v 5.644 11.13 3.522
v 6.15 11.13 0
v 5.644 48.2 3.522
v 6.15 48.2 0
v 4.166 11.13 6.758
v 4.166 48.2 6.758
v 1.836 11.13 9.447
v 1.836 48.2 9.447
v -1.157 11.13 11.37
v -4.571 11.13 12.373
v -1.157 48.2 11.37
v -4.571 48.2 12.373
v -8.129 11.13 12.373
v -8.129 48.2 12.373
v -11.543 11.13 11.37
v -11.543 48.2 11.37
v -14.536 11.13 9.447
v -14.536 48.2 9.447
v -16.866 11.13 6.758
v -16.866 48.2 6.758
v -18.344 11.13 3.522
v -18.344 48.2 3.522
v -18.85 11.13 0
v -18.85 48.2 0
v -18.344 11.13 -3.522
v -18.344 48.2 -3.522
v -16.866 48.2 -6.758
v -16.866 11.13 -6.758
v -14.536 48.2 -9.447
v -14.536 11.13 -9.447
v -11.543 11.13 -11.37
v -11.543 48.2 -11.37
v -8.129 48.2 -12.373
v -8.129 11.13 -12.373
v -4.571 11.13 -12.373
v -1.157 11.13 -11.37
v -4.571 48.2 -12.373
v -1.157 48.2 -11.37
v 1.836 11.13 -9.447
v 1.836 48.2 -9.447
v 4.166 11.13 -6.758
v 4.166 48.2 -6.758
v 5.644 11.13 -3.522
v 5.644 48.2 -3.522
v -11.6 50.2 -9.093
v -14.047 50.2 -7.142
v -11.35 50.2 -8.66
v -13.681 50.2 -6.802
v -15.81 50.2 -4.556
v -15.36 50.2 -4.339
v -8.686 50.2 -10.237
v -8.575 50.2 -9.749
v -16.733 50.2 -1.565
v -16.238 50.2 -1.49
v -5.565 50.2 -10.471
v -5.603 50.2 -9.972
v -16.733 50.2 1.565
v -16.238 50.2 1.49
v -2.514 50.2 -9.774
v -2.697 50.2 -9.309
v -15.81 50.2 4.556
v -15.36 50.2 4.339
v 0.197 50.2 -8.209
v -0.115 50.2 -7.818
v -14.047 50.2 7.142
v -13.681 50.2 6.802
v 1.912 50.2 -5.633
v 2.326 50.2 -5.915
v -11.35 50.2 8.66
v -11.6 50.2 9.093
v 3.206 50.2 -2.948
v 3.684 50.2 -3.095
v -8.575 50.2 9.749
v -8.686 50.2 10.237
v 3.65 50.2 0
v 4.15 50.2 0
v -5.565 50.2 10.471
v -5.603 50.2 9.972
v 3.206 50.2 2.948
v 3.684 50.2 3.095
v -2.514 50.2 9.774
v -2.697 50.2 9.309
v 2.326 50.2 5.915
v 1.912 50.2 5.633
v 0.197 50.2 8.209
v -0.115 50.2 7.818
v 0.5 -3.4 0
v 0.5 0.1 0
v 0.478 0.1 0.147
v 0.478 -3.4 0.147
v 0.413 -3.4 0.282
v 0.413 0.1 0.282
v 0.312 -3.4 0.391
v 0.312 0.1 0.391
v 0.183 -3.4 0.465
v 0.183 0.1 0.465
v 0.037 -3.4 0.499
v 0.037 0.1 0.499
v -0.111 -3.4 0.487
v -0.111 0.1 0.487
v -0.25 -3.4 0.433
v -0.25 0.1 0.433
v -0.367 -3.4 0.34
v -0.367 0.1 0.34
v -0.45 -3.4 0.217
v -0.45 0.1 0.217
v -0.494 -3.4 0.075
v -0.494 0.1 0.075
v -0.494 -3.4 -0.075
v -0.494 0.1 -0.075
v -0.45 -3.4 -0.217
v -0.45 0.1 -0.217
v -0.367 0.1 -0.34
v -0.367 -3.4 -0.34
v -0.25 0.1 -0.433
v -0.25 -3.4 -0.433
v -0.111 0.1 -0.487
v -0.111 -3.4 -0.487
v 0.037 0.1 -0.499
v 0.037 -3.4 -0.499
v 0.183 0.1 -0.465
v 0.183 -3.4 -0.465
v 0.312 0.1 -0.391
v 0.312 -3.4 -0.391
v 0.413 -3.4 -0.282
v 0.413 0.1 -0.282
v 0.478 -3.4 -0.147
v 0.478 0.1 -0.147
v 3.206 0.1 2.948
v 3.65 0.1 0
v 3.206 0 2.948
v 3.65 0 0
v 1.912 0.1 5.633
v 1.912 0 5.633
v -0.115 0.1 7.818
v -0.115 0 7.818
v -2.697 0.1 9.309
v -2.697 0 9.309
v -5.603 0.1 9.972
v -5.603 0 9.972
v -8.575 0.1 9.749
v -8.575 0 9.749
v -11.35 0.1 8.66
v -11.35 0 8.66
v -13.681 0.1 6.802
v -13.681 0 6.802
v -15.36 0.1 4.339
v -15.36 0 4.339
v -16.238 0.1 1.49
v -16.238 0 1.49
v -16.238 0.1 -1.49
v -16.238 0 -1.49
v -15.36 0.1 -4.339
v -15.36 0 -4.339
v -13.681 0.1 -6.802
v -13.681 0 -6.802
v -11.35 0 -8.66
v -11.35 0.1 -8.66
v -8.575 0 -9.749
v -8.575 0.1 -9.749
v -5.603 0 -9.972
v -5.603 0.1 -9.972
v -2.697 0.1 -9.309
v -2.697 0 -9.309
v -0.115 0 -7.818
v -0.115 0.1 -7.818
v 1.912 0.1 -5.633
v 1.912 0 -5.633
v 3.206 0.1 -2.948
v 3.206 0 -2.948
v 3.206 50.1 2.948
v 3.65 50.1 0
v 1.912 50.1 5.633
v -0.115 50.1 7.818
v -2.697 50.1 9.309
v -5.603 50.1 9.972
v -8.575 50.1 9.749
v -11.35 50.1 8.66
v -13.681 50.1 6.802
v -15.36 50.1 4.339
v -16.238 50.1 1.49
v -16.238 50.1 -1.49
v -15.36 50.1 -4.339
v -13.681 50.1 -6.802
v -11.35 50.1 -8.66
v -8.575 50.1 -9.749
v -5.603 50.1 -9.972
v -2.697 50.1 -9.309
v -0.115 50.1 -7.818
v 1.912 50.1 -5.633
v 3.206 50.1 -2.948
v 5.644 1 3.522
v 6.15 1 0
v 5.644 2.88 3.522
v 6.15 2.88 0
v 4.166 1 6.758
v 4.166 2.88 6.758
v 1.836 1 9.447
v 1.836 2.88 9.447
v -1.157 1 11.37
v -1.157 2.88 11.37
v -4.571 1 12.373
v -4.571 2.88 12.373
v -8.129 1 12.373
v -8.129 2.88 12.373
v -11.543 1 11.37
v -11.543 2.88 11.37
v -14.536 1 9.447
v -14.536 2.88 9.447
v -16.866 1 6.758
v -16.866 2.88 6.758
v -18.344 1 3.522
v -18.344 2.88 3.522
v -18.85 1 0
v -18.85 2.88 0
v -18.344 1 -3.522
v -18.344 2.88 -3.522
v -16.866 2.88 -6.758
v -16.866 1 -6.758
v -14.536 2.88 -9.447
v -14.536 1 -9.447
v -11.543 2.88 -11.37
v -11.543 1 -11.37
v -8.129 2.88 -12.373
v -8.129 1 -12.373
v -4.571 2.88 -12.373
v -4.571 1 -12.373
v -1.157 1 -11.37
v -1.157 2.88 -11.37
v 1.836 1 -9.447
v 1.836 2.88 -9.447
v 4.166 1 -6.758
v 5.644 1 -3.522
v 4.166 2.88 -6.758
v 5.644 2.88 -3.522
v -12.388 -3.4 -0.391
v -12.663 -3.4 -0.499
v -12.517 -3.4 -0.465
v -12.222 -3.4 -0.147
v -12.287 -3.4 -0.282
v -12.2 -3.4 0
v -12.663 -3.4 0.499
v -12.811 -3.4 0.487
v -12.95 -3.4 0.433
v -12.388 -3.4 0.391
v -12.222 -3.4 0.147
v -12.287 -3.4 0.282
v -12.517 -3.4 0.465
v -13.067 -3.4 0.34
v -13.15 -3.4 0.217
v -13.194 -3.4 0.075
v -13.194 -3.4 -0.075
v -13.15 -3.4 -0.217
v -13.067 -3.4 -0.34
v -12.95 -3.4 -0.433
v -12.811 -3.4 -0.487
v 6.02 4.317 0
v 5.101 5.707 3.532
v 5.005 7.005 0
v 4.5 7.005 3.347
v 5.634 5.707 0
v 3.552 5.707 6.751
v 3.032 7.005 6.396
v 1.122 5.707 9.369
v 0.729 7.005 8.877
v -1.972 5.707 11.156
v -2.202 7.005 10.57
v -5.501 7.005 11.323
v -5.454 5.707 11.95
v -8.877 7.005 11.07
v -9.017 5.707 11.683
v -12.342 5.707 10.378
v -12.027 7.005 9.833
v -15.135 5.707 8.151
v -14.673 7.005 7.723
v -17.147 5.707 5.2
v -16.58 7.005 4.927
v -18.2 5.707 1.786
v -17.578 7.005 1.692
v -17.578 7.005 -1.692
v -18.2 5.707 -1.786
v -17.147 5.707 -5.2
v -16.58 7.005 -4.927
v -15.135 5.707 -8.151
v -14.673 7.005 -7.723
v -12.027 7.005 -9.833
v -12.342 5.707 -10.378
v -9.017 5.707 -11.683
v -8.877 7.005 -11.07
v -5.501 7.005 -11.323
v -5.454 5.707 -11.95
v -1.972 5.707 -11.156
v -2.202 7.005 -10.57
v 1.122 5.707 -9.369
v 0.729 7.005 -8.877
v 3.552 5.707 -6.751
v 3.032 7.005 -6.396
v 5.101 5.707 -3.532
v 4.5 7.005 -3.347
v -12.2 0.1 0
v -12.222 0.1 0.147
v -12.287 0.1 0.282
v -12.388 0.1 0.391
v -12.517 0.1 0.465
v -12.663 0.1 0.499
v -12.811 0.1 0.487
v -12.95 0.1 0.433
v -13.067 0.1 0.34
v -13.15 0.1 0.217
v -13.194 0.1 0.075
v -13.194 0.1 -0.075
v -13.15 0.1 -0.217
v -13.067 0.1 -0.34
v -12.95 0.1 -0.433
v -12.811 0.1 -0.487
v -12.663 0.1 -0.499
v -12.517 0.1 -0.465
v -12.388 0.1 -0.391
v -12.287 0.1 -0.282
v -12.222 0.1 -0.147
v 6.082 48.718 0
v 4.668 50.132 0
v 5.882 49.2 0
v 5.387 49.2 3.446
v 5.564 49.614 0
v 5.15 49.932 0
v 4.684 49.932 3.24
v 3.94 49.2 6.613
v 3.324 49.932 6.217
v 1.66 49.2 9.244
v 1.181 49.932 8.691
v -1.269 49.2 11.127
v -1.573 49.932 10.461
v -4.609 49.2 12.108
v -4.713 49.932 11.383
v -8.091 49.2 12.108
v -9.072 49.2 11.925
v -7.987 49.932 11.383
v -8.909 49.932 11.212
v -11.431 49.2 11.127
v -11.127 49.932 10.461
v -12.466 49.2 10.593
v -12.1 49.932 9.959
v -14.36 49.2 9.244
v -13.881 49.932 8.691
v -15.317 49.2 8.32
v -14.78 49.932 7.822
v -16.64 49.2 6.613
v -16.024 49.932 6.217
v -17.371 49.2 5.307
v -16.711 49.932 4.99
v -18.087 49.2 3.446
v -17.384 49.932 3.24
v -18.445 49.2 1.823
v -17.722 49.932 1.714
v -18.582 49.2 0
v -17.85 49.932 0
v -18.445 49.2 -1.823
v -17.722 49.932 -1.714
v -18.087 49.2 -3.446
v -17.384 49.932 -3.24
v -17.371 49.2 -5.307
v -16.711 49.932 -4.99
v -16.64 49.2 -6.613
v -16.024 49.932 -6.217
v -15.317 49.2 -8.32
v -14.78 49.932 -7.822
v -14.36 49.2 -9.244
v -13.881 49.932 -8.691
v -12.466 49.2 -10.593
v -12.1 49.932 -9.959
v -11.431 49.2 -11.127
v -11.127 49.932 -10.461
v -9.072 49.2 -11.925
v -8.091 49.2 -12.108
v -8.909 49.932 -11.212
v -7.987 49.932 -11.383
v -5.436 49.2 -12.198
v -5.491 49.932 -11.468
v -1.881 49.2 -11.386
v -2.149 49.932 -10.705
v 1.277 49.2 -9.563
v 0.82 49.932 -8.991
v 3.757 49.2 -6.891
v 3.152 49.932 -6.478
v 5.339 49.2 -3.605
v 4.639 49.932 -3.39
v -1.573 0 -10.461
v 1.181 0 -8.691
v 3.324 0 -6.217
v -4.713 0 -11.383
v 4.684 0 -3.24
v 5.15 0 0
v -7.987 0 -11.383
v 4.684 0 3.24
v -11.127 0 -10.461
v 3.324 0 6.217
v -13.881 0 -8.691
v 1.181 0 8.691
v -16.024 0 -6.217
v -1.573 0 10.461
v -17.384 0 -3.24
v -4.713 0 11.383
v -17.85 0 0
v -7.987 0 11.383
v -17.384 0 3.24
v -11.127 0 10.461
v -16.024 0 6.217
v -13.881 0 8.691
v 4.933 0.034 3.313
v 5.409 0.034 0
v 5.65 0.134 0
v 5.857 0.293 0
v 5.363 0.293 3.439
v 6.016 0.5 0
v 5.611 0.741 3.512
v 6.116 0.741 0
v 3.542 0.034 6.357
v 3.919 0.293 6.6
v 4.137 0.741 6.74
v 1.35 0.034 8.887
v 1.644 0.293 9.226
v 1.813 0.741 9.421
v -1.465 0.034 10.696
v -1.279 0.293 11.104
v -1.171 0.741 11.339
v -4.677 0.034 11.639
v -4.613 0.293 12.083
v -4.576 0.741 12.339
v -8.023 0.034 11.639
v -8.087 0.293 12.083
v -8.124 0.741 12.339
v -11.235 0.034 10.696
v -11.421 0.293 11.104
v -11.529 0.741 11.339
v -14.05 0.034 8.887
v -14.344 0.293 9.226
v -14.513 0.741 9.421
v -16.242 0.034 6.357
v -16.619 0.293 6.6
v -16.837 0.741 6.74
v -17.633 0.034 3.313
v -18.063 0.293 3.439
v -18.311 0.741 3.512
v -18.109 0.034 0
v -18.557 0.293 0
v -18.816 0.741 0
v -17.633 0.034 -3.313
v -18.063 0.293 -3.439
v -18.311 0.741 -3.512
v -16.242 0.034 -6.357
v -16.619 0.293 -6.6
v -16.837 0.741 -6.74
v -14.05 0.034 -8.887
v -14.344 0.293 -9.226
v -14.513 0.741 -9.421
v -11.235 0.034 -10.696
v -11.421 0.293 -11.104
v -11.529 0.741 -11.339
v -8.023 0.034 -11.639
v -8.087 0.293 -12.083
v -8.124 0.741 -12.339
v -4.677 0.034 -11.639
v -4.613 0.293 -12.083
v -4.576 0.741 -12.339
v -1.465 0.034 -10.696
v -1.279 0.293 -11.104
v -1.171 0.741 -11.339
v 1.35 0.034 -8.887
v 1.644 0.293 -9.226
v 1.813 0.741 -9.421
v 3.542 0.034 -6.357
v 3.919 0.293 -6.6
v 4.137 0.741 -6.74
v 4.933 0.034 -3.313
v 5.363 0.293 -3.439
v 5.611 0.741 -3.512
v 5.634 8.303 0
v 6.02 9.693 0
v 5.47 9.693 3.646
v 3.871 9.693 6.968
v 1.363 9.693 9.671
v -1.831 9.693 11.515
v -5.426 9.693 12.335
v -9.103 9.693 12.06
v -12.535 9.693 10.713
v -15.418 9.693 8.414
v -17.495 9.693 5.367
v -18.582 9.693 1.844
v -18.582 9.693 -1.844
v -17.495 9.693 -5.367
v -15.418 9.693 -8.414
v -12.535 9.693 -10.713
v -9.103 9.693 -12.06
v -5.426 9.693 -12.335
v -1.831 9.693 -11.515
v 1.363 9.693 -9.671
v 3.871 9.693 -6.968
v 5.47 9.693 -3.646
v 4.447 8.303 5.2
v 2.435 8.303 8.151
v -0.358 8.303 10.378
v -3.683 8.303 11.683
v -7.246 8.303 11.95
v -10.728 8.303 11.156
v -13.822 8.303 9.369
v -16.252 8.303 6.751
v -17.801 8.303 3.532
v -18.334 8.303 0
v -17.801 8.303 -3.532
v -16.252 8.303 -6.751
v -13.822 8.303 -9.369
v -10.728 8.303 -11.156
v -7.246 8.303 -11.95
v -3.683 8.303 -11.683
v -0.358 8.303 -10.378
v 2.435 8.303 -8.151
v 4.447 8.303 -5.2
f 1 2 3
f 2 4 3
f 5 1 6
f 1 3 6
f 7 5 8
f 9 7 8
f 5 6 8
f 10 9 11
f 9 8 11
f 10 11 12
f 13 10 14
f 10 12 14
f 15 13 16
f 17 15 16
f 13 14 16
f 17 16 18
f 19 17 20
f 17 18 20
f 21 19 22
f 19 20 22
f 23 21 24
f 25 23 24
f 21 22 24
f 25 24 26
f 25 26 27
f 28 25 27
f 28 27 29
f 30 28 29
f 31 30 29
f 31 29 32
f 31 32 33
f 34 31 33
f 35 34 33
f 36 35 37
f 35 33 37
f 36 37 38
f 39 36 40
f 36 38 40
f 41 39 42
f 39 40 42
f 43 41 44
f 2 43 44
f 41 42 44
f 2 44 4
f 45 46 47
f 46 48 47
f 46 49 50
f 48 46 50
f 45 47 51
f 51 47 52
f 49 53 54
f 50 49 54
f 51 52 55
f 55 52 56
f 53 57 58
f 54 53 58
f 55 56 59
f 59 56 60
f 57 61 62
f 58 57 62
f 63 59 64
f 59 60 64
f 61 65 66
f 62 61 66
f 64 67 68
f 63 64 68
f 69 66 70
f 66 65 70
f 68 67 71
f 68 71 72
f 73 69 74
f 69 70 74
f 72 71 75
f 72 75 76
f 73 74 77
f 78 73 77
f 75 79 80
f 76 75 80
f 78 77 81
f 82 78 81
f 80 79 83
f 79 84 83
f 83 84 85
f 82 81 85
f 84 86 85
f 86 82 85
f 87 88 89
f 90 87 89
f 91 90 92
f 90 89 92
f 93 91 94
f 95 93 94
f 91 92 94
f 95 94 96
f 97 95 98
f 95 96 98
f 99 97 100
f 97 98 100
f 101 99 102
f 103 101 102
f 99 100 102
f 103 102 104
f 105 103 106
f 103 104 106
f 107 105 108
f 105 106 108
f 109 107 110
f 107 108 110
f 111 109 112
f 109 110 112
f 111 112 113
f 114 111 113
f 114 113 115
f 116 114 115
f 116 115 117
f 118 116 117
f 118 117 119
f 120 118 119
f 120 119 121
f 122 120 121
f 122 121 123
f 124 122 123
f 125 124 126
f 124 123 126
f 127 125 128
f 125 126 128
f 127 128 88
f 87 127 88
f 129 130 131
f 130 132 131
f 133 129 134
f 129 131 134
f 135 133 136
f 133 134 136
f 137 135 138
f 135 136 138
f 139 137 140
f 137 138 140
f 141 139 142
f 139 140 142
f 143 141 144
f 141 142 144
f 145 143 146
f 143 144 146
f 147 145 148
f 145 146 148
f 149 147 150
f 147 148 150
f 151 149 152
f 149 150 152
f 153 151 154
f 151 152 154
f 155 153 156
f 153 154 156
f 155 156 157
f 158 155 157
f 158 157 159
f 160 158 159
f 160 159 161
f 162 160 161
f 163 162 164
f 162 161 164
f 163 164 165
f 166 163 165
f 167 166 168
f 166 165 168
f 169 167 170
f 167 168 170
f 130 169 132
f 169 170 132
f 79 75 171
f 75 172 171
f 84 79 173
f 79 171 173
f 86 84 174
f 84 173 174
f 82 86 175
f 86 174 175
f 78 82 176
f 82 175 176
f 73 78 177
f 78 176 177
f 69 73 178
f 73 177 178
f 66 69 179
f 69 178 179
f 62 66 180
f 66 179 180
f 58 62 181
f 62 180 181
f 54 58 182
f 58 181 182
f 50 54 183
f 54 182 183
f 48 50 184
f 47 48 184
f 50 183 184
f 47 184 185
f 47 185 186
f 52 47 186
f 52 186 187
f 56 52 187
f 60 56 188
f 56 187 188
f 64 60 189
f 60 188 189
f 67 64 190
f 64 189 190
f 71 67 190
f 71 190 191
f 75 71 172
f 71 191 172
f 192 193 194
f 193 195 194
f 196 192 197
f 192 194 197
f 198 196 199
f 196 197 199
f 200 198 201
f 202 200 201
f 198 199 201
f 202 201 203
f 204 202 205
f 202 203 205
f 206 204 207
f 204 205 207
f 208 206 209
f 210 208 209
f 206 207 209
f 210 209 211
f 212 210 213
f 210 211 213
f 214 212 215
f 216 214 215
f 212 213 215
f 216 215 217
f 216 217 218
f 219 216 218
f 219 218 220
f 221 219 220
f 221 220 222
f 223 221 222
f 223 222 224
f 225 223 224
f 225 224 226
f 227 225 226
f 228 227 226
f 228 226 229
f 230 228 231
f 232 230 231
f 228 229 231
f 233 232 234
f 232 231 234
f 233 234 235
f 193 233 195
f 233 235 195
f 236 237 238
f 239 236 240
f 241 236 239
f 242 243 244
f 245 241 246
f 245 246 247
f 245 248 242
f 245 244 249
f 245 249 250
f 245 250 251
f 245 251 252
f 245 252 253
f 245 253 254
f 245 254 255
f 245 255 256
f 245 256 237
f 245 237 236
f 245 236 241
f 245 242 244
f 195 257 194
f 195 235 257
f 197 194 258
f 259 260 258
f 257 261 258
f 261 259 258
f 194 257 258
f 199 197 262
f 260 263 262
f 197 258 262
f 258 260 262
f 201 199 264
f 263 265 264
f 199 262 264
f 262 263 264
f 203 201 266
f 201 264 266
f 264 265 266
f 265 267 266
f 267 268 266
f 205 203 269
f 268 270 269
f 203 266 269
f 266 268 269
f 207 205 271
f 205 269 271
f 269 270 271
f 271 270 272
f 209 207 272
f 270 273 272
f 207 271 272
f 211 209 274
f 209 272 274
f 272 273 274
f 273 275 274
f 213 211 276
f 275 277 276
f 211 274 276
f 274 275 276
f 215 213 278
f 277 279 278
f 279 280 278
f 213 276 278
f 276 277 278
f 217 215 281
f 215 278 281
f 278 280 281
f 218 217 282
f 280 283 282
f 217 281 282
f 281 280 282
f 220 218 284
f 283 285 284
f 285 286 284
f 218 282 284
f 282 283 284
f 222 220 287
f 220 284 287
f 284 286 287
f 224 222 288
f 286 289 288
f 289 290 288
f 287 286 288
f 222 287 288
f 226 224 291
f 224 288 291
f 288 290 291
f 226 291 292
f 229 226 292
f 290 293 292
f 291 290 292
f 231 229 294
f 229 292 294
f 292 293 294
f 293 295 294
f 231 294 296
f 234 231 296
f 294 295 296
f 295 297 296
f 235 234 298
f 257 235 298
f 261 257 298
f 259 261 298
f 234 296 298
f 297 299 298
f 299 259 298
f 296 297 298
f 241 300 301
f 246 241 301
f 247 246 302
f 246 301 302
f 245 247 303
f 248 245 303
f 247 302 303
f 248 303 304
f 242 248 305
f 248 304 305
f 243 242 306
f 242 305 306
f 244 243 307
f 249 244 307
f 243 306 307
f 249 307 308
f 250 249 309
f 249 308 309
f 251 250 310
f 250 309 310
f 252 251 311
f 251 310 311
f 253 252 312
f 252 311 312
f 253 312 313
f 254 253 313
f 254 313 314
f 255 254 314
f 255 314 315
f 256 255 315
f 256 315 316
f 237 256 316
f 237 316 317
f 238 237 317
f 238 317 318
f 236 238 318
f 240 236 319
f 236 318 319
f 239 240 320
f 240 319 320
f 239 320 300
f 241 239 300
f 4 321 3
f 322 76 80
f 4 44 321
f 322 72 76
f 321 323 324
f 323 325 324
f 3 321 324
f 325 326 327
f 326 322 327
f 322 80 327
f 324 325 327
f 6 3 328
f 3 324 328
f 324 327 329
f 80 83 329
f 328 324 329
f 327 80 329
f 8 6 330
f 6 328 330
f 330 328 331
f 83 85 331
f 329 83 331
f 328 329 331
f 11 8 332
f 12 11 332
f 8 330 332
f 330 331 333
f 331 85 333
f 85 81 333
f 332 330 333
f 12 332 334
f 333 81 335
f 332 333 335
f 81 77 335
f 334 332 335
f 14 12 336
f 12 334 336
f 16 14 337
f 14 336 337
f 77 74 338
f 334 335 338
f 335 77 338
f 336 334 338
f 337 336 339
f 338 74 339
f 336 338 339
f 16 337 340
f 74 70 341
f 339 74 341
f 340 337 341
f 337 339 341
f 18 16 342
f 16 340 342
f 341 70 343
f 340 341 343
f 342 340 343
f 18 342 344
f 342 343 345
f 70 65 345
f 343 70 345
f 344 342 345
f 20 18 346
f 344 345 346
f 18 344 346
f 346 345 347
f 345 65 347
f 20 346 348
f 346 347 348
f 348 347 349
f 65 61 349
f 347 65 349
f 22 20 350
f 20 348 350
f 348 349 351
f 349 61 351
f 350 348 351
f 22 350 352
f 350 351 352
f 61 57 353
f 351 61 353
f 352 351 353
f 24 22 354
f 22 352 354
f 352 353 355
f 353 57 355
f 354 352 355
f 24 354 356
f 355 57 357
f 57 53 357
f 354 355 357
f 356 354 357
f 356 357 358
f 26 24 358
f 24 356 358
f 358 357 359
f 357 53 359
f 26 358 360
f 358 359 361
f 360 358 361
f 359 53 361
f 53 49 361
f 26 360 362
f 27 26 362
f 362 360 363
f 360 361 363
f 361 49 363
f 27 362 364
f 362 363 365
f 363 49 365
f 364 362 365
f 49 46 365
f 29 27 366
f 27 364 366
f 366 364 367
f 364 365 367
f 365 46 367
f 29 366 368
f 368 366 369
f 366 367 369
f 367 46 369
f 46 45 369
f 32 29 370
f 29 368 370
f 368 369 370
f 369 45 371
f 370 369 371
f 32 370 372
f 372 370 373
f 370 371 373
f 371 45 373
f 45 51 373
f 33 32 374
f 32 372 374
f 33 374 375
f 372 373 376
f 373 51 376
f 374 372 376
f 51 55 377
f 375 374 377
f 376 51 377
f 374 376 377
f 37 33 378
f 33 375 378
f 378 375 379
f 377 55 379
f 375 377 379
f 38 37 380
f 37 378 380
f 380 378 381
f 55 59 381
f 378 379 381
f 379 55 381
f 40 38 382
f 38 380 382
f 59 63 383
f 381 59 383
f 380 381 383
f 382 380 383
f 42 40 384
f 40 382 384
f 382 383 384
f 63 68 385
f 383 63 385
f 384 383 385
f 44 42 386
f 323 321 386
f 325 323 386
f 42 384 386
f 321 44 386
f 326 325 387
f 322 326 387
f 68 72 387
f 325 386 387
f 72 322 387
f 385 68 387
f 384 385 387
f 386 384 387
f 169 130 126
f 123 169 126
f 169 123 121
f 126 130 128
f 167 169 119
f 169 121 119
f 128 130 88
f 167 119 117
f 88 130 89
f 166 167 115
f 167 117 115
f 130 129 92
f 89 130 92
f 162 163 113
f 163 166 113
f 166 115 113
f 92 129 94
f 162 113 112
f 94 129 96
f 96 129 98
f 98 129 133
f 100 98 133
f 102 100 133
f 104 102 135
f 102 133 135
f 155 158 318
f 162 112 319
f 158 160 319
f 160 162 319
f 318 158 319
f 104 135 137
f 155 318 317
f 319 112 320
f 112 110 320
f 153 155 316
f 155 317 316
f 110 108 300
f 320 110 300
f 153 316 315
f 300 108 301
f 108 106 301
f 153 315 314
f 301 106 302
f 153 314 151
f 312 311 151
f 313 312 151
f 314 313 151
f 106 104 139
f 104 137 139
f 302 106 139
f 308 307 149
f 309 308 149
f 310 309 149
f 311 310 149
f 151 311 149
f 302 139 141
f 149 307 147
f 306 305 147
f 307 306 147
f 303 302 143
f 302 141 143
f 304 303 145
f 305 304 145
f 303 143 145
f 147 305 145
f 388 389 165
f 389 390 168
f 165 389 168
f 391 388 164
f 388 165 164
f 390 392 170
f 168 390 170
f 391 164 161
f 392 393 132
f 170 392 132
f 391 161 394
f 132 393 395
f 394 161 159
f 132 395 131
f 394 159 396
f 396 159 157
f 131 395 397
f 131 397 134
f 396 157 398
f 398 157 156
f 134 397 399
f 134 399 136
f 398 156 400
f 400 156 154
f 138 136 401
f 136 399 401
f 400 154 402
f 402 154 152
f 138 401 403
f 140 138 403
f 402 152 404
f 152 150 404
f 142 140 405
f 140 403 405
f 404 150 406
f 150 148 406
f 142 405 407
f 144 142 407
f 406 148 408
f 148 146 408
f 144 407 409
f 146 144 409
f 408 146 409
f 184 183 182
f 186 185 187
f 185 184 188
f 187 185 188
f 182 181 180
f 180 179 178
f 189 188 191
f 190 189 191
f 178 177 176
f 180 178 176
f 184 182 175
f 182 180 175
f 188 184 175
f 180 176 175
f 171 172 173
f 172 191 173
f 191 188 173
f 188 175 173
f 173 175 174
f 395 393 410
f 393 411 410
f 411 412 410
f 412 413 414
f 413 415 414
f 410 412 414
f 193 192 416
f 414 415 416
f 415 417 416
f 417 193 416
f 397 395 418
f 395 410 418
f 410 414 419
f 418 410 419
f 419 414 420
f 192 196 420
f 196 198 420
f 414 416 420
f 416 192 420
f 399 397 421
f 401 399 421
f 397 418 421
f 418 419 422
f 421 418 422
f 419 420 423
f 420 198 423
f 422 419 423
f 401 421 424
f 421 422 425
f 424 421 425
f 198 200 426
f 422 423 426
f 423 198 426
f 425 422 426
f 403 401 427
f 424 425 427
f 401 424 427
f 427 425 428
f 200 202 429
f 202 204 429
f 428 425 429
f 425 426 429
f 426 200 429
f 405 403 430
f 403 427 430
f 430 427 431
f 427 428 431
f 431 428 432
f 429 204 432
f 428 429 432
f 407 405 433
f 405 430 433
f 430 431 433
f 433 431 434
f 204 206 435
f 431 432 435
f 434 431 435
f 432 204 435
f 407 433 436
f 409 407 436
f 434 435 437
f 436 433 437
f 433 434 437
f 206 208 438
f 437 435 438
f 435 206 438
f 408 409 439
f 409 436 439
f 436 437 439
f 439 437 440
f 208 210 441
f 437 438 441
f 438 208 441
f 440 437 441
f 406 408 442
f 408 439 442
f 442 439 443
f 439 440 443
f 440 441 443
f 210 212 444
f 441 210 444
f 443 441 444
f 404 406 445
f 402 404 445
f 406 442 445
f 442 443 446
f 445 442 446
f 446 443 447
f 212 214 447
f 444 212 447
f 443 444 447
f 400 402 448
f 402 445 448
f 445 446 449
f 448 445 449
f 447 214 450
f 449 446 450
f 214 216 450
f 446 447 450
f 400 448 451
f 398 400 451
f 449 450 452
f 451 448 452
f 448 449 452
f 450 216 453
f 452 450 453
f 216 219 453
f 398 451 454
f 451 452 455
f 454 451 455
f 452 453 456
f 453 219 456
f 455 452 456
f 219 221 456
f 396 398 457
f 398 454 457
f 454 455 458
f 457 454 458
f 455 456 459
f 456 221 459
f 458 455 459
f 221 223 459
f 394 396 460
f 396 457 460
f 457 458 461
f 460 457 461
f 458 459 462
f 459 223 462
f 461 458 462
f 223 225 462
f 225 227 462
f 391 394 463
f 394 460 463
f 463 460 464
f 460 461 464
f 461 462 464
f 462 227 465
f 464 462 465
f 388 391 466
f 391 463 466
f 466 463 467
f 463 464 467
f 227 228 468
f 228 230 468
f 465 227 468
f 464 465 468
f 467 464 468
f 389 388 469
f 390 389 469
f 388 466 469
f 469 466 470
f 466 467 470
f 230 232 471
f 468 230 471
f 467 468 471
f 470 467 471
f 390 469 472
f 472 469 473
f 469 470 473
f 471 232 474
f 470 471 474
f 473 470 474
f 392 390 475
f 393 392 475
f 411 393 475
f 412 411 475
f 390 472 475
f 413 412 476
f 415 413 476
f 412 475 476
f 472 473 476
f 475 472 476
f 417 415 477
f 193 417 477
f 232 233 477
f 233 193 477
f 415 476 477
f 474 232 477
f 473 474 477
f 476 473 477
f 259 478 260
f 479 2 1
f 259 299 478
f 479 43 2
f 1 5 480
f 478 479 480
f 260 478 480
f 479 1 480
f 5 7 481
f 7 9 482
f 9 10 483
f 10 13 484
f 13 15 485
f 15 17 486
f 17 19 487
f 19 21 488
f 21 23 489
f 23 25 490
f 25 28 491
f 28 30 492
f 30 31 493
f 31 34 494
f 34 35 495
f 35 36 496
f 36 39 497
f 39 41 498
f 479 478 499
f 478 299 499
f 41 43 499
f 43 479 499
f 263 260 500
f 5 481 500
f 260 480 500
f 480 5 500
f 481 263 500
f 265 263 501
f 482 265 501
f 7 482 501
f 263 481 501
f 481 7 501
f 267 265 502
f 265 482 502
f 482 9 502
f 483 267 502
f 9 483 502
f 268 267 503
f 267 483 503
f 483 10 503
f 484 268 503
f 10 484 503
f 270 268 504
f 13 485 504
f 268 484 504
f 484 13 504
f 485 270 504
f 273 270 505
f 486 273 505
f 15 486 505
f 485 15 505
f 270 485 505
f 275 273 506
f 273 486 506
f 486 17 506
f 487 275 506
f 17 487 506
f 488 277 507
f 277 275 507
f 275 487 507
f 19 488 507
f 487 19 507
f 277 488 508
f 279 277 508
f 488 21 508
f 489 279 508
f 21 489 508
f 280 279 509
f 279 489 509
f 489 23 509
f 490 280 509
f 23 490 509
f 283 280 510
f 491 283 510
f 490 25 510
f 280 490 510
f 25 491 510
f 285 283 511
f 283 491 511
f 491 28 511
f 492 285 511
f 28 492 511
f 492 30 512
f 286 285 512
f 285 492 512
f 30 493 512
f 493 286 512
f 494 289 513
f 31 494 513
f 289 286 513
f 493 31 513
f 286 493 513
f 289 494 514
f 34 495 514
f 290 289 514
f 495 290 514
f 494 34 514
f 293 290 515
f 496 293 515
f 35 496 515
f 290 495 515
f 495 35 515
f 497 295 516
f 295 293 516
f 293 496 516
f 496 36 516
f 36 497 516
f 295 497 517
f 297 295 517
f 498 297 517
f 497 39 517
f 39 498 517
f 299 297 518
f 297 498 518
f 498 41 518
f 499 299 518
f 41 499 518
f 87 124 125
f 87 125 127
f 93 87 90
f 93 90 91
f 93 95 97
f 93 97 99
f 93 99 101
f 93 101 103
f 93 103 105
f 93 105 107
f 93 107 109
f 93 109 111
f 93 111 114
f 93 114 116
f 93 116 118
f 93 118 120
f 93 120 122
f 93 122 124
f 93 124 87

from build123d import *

# Parameters (mm, degrees)
SKETCH2_R           = 0.5
BOSS_EXTRUDE1_DEPTH = 3.5


with BuildPart() as part:
    # Sketch1 → Base-Revolve (revolve)
    with BuildSketch(Plane.XY):
        with BuildLine():
            Line((-6.35, 0.1), (3.65, 0.1))
            Line((3.65, 0.1), (3.65, 0))
            Line((3.65, 0), (5.15, 0))
            ThreePointArc((5.15, 0), (5.857106781, 0.292893219), (6.15, 1))
            Line((6.15, 1), (6.15, 2.88))
            ThreePointArc((6.15, 2.88), (5.858311082, 5.020546719), (5.004514935, 7.005))
            ThreePointArc((5.004514935, 7.005), (5.858311082, 8.989453281), (6.15, 11.13))
            Line((6.15, 11.13), (6.15, 48.2))
            ThreePointArc((6.15, 48.2), (5.564213562, 49.614213562), (4.15, 50.2))
            Line((4.15, 50.2), (3.65, 50.2))
            Line((3.65, 50.2), (3.65, 50.1))
            Line((3.65, 50.1), (-6.35, 50.1))
            Line((-6.35, 50.1), (-6.35, 0.1))
        make_face()
    revolve(axis=Axis((-6.35, 50.2, 0), (0, -1, 0)))

    # Sketch2 → Boss-Extrude1 (add)
    with BuildSketch(Plane.XZ.offset(-0.1)):
        Circle(SKETCH2_R)
        with Locations((-12.7, 0)):
            Circle(SKETCH2_R)
    extrude(amount=BOSS_EXTRUDE1_DEPTH)


solid = part.part
